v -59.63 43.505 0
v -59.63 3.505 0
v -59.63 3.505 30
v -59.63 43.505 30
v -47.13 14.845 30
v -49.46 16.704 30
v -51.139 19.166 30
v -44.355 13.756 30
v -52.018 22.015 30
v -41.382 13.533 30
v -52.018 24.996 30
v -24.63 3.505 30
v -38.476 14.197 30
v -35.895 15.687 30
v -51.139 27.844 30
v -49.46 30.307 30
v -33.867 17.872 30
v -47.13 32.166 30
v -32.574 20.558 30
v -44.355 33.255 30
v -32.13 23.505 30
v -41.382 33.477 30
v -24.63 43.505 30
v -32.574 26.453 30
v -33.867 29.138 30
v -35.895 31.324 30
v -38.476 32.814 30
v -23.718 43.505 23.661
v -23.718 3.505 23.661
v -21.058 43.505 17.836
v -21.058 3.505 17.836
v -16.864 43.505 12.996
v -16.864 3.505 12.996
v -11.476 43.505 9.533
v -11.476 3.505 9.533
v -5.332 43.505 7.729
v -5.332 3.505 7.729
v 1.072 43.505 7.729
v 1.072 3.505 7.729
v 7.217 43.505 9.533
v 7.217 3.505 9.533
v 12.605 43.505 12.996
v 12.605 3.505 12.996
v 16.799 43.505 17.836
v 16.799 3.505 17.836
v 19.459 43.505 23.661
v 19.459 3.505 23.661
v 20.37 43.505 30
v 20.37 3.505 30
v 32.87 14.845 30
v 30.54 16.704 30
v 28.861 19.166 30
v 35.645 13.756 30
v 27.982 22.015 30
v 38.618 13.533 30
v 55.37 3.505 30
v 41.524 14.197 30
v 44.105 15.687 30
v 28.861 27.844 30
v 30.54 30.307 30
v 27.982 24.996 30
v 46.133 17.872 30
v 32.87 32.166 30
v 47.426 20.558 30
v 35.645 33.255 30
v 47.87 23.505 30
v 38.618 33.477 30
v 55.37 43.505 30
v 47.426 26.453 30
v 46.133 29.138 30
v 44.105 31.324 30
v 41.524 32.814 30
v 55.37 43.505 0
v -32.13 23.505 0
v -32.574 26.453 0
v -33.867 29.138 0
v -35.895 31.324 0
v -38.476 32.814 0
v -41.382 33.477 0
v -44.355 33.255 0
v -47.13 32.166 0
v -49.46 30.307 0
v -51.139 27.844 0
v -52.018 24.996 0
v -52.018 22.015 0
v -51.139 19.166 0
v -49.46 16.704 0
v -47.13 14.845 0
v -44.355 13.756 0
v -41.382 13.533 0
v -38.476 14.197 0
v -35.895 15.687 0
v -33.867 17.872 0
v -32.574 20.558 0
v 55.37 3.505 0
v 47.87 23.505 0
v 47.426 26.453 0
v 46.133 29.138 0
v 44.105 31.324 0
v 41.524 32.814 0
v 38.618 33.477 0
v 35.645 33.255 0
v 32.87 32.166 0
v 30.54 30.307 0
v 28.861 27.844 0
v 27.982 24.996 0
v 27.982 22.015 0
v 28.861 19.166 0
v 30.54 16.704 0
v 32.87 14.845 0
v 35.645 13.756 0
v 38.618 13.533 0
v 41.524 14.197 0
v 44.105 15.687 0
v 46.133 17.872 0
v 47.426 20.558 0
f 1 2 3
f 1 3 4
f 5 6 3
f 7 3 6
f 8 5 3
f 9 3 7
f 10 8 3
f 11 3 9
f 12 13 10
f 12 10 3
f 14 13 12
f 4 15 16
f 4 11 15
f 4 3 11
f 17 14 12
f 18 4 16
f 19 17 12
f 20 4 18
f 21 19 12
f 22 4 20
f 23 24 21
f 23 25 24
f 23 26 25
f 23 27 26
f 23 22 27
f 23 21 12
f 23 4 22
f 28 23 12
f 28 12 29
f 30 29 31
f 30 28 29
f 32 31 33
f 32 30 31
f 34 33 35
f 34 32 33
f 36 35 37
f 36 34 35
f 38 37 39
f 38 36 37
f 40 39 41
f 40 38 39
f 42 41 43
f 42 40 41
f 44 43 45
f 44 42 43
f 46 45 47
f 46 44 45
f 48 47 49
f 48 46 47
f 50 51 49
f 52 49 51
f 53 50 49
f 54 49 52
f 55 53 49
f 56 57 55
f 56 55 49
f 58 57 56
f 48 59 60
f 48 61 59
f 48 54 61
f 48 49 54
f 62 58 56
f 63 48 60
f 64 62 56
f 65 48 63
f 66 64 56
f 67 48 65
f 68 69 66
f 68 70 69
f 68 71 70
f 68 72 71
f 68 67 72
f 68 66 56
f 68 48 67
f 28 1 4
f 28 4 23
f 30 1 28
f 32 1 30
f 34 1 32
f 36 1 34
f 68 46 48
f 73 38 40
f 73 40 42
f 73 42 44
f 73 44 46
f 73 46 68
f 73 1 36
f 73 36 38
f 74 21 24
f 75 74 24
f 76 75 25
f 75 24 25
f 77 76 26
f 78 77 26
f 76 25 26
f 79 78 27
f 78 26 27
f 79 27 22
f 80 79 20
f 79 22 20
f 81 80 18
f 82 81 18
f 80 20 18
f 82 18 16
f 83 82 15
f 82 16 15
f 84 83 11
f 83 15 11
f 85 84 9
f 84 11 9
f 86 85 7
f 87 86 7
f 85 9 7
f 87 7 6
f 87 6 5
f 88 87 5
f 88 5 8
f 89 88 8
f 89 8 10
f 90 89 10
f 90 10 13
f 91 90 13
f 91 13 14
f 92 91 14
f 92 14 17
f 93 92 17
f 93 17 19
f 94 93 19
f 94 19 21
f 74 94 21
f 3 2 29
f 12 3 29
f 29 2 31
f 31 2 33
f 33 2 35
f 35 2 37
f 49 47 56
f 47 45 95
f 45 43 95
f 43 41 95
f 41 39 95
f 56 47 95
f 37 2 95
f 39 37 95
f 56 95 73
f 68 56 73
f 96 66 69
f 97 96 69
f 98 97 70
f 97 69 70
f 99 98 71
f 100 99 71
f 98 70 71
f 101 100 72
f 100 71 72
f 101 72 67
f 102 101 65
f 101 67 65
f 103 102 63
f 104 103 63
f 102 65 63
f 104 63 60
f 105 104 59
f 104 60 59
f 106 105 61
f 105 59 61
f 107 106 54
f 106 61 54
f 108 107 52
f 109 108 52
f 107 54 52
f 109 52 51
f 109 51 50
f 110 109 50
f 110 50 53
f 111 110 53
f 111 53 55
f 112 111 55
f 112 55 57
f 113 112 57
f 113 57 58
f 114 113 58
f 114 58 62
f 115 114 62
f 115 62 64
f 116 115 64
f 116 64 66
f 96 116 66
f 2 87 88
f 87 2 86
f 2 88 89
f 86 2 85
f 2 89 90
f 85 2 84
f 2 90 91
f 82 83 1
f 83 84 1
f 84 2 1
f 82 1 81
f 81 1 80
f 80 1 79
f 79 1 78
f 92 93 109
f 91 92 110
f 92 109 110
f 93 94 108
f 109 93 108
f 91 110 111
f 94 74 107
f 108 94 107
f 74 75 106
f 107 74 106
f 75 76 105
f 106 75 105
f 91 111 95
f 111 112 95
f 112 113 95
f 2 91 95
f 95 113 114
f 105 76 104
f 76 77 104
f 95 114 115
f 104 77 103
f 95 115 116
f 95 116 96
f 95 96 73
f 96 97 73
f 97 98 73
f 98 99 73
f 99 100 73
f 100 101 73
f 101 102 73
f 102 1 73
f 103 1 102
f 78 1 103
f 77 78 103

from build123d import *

# Parameters (mm, degrees)
SKETCH2_W           = 115
SKETCH2_H           = 40
BOSS_EXTRUDE1_DEPTH = 60
CUT_EXTRUDE1_DEPTH  = 60
SKETCH4_R           = 10
CUT_EXTRUDE2_DEPTH  = 60


with BuildPart() as part:
    # Sketch2 → Boss-Extrude1 (new body)
    with BuildSketch(Plane.XY):
        with Locations((-2.12962963, 23.505291005)):
            Rectangle(SKETCH2_W, SKETCH2_H)
    extrude(amount=BOSS_EXTRUDE1_DEPTH)

    # Sketch3 → Cut-Extrude1 (cut)
    with BuildSketch(Plane(origin=(0, 43.505291005, 0), x_dir=(1, 0, 0), z_dir=(0, 1, 0))):
        with BuildLine():
            Line((-59.62962963, -30), (-24.62962963, -30))
            ThreePointArc((-24.62962963, -30), (-2.12962963, -7.5), (20.37037037, -30))
            Line((20.37037037, -30), (55.37037037, -30))
            Line((55.37037037, -30), (55.37037037, -60))
            Line((55.37037037, -60), (-59.62962963, -60))
            Line((-59.62962963, -60), (-59.62962963, -30))
        make_face()
    extrude(amount=-CUT_EXTRUDE1_DEPTH, mode=Mode.SUBTRACT)

    # Sketch4 → Cut-Extrude2 (cut)
    with BuildSketch(Plane.XY.offset(30)):
        with Locations((-42.12962963, 23.505291005)):
            Circle(SKETCH4_R)
        with Locations((37.87037037, 23.505291005)):
            Circle(SKETCH4_R)
    extrude(amount=-CUT_EXTRUDE2_DEPTH, mode=Mode.SUBTRACT)


solid = part.part
